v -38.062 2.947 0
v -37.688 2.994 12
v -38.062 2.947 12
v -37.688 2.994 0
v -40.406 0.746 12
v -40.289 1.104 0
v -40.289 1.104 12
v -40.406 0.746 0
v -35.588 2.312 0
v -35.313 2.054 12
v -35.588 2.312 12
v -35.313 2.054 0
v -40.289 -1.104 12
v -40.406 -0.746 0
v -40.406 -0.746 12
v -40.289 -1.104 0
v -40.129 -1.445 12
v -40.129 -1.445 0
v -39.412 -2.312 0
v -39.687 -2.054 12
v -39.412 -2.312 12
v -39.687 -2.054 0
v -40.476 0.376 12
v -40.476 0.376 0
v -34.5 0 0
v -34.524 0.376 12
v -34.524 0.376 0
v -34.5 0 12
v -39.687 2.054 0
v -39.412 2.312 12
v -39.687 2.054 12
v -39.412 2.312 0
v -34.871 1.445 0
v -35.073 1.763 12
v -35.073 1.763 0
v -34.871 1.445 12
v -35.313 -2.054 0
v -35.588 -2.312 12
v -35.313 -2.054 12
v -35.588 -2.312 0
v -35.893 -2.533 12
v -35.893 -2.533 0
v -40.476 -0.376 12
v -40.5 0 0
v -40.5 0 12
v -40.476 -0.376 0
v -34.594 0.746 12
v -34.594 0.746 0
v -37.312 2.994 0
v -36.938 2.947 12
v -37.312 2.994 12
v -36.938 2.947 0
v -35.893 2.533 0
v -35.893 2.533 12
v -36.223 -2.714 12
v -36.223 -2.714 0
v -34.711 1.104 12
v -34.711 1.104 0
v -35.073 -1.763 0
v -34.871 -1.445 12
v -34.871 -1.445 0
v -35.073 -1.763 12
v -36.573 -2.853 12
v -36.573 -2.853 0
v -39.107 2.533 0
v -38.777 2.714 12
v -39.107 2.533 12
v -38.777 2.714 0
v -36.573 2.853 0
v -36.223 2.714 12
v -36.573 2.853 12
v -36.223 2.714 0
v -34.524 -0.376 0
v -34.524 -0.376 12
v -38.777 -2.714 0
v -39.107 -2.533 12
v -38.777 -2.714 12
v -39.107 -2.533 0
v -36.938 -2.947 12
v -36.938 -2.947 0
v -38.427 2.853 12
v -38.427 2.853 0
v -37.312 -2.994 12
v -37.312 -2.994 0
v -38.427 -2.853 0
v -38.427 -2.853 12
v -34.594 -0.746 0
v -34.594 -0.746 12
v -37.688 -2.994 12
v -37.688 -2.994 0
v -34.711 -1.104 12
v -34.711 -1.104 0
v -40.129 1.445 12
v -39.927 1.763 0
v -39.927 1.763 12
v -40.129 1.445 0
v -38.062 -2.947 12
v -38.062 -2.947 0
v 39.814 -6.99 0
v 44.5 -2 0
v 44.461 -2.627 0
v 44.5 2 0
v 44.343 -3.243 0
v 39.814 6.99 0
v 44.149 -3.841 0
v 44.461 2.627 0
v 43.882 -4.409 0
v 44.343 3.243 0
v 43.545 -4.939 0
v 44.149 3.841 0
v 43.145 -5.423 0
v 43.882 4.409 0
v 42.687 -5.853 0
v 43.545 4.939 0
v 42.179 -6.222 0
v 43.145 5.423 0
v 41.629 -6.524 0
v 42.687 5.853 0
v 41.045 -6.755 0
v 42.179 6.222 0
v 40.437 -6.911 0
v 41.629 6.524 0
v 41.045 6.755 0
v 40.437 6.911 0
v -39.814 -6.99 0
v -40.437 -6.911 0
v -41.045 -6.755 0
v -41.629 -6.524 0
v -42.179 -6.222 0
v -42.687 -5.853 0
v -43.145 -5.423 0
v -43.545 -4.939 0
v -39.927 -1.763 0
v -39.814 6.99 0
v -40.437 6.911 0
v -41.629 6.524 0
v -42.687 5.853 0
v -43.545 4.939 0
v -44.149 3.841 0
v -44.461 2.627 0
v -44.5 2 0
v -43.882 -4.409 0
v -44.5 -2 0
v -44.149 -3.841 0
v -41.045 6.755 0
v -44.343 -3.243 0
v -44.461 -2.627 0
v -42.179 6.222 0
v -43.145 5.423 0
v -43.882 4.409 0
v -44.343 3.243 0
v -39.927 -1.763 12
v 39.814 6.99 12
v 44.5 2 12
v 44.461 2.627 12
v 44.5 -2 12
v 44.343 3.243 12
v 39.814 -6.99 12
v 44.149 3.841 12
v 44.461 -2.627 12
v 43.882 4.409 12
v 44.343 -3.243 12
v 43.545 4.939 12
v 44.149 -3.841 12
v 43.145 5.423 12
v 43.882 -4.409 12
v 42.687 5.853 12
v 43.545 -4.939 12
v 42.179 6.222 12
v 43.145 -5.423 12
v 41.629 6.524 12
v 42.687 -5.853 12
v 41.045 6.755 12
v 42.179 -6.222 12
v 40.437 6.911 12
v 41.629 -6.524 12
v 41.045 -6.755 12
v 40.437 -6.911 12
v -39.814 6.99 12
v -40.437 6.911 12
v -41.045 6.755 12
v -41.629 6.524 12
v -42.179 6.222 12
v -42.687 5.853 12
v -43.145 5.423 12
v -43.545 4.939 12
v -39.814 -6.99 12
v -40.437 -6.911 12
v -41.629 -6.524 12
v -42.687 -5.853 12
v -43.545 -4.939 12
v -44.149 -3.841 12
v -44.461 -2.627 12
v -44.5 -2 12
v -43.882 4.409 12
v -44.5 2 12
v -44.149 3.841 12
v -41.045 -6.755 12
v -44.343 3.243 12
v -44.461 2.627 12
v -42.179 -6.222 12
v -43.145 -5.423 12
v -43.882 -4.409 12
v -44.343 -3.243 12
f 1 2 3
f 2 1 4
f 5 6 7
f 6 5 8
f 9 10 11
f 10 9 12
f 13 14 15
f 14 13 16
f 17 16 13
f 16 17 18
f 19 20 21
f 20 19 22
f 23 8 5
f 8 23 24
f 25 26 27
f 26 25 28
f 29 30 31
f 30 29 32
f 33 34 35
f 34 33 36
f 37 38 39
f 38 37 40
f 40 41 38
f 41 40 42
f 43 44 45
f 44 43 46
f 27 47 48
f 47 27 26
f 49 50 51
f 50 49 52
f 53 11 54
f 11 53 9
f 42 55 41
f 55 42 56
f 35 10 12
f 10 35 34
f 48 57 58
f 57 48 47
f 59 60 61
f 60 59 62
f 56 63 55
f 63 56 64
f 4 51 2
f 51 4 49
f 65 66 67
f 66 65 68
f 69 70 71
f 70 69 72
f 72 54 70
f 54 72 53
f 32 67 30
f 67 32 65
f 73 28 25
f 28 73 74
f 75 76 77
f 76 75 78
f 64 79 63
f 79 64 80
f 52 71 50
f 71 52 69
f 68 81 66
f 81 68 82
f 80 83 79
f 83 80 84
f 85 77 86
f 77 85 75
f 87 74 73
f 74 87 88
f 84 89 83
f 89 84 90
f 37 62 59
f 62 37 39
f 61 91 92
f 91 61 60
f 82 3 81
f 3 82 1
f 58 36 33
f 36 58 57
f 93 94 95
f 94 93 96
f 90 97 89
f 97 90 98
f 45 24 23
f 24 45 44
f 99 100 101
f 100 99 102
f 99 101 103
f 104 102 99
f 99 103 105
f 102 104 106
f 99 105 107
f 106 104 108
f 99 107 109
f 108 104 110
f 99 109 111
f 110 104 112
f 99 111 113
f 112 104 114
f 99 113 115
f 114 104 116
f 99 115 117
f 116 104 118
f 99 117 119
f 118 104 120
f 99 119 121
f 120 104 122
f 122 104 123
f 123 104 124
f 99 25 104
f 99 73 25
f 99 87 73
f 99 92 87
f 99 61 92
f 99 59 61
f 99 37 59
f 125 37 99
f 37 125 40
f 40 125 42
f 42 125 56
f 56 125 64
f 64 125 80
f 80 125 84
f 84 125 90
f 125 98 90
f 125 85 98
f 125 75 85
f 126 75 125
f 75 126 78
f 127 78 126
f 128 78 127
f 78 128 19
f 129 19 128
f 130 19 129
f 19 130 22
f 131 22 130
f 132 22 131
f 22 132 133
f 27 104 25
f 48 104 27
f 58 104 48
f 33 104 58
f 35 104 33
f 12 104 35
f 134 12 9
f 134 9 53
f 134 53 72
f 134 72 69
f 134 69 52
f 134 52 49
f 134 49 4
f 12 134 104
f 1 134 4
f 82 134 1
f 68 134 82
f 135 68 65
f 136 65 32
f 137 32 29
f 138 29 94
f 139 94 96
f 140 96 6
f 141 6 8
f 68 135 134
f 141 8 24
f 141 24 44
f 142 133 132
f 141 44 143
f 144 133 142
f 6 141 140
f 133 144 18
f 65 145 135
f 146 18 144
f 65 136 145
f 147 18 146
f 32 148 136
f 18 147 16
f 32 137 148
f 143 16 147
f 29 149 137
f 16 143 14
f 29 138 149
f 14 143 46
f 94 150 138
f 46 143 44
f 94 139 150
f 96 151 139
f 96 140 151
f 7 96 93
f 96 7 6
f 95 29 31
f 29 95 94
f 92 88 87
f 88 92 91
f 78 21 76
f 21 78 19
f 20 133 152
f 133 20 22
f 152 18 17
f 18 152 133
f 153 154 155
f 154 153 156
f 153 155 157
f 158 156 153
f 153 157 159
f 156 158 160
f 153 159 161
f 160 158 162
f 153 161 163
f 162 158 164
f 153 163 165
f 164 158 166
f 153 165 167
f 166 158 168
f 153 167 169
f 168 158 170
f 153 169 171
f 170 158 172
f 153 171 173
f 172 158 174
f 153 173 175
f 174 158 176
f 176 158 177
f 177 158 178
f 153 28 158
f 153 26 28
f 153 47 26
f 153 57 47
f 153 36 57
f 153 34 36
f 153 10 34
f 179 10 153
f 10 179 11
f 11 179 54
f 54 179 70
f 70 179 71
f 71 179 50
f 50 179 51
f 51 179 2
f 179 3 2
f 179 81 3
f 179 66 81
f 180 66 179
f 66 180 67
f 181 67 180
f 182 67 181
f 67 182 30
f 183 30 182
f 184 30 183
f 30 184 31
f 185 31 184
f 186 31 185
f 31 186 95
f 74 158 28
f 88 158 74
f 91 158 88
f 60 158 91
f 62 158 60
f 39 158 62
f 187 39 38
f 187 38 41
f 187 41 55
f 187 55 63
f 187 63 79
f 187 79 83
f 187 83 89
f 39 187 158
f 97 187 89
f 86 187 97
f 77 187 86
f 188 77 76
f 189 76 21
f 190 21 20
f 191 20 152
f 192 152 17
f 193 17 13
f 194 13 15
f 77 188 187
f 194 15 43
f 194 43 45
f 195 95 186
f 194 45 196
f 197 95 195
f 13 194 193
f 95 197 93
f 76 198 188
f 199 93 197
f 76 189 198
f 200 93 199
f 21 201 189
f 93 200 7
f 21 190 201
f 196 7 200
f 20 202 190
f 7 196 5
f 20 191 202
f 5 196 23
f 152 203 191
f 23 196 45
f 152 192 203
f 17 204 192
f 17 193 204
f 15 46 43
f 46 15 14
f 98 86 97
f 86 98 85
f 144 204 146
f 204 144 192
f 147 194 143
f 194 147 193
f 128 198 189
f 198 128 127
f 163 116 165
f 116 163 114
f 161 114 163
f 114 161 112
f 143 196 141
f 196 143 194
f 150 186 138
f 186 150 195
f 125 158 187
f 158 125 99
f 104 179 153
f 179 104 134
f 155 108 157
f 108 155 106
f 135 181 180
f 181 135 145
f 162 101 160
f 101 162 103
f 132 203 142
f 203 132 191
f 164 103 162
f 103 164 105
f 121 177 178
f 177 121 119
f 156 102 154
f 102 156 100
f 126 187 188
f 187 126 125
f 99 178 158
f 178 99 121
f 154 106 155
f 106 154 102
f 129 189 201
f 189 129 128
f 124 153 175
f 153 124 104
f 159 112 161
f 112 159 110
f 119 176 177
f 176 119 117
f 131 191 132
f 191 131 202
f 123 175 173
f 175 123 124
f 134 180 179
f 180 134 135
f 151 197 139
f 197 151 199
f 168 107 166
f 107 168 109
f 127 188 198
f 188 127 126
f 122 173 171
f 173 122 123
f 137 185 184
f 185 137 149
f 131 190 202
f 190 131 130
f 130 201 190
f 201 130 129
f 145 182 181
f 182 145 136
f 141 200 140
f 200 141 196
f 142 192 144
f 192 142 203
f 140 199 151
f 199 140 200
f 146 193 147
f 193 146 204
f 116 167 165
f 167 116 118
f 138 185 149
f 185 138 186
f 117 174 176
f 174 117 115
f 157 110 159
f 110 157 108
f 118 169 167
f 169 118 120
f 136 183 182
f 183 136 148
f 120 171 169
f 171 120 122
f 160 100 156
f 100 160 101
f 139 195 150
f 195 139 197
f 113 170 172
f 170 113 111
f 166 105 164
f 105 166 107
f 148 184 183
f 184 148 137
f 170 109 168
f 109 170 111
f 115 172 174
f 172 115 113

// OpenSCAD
$fn = 50;


difference() {
	union() {
		hull() {
			translate(v = [-39.5000000000, 2.0000000000, 0]) {
				cylinder(h = 12, r = 5);
			}
			translate(v = [39.5000000000, 2.0000000000, 0]) {
				cylinder(h = 12, r = 5);
			}
			translate(v = [-39.5000000000, -2.0000000000, 0]) {
				cylinder(h = 12, r = 5);
			}
			translate(v = [39.5000000000, -2.0000000000, 0]) {
				cylinder(h = 12, r = 5);
			}
		}
	}
	union() {
		translate(v = [-37.5000000000, 0.0000000000, 0]) {
			cylinder(h = 12, r = 3.0000000000);
		}
		translate(v = [-37.5000000000, 0.0000000000, 0]) {
			cylinder(h = 12, r = 1.5000000000);
		}
		translate(v = [-37.5000000000, 0.0000000000, 0]) {
			cylinder(h = 12, r = 1.5000000000);
		}
		translate(v = [-37.5000000000, 0.0000000000, 0]) {
			cylinder(h = 12, r = 1.5000000000);
		}
	}
}
